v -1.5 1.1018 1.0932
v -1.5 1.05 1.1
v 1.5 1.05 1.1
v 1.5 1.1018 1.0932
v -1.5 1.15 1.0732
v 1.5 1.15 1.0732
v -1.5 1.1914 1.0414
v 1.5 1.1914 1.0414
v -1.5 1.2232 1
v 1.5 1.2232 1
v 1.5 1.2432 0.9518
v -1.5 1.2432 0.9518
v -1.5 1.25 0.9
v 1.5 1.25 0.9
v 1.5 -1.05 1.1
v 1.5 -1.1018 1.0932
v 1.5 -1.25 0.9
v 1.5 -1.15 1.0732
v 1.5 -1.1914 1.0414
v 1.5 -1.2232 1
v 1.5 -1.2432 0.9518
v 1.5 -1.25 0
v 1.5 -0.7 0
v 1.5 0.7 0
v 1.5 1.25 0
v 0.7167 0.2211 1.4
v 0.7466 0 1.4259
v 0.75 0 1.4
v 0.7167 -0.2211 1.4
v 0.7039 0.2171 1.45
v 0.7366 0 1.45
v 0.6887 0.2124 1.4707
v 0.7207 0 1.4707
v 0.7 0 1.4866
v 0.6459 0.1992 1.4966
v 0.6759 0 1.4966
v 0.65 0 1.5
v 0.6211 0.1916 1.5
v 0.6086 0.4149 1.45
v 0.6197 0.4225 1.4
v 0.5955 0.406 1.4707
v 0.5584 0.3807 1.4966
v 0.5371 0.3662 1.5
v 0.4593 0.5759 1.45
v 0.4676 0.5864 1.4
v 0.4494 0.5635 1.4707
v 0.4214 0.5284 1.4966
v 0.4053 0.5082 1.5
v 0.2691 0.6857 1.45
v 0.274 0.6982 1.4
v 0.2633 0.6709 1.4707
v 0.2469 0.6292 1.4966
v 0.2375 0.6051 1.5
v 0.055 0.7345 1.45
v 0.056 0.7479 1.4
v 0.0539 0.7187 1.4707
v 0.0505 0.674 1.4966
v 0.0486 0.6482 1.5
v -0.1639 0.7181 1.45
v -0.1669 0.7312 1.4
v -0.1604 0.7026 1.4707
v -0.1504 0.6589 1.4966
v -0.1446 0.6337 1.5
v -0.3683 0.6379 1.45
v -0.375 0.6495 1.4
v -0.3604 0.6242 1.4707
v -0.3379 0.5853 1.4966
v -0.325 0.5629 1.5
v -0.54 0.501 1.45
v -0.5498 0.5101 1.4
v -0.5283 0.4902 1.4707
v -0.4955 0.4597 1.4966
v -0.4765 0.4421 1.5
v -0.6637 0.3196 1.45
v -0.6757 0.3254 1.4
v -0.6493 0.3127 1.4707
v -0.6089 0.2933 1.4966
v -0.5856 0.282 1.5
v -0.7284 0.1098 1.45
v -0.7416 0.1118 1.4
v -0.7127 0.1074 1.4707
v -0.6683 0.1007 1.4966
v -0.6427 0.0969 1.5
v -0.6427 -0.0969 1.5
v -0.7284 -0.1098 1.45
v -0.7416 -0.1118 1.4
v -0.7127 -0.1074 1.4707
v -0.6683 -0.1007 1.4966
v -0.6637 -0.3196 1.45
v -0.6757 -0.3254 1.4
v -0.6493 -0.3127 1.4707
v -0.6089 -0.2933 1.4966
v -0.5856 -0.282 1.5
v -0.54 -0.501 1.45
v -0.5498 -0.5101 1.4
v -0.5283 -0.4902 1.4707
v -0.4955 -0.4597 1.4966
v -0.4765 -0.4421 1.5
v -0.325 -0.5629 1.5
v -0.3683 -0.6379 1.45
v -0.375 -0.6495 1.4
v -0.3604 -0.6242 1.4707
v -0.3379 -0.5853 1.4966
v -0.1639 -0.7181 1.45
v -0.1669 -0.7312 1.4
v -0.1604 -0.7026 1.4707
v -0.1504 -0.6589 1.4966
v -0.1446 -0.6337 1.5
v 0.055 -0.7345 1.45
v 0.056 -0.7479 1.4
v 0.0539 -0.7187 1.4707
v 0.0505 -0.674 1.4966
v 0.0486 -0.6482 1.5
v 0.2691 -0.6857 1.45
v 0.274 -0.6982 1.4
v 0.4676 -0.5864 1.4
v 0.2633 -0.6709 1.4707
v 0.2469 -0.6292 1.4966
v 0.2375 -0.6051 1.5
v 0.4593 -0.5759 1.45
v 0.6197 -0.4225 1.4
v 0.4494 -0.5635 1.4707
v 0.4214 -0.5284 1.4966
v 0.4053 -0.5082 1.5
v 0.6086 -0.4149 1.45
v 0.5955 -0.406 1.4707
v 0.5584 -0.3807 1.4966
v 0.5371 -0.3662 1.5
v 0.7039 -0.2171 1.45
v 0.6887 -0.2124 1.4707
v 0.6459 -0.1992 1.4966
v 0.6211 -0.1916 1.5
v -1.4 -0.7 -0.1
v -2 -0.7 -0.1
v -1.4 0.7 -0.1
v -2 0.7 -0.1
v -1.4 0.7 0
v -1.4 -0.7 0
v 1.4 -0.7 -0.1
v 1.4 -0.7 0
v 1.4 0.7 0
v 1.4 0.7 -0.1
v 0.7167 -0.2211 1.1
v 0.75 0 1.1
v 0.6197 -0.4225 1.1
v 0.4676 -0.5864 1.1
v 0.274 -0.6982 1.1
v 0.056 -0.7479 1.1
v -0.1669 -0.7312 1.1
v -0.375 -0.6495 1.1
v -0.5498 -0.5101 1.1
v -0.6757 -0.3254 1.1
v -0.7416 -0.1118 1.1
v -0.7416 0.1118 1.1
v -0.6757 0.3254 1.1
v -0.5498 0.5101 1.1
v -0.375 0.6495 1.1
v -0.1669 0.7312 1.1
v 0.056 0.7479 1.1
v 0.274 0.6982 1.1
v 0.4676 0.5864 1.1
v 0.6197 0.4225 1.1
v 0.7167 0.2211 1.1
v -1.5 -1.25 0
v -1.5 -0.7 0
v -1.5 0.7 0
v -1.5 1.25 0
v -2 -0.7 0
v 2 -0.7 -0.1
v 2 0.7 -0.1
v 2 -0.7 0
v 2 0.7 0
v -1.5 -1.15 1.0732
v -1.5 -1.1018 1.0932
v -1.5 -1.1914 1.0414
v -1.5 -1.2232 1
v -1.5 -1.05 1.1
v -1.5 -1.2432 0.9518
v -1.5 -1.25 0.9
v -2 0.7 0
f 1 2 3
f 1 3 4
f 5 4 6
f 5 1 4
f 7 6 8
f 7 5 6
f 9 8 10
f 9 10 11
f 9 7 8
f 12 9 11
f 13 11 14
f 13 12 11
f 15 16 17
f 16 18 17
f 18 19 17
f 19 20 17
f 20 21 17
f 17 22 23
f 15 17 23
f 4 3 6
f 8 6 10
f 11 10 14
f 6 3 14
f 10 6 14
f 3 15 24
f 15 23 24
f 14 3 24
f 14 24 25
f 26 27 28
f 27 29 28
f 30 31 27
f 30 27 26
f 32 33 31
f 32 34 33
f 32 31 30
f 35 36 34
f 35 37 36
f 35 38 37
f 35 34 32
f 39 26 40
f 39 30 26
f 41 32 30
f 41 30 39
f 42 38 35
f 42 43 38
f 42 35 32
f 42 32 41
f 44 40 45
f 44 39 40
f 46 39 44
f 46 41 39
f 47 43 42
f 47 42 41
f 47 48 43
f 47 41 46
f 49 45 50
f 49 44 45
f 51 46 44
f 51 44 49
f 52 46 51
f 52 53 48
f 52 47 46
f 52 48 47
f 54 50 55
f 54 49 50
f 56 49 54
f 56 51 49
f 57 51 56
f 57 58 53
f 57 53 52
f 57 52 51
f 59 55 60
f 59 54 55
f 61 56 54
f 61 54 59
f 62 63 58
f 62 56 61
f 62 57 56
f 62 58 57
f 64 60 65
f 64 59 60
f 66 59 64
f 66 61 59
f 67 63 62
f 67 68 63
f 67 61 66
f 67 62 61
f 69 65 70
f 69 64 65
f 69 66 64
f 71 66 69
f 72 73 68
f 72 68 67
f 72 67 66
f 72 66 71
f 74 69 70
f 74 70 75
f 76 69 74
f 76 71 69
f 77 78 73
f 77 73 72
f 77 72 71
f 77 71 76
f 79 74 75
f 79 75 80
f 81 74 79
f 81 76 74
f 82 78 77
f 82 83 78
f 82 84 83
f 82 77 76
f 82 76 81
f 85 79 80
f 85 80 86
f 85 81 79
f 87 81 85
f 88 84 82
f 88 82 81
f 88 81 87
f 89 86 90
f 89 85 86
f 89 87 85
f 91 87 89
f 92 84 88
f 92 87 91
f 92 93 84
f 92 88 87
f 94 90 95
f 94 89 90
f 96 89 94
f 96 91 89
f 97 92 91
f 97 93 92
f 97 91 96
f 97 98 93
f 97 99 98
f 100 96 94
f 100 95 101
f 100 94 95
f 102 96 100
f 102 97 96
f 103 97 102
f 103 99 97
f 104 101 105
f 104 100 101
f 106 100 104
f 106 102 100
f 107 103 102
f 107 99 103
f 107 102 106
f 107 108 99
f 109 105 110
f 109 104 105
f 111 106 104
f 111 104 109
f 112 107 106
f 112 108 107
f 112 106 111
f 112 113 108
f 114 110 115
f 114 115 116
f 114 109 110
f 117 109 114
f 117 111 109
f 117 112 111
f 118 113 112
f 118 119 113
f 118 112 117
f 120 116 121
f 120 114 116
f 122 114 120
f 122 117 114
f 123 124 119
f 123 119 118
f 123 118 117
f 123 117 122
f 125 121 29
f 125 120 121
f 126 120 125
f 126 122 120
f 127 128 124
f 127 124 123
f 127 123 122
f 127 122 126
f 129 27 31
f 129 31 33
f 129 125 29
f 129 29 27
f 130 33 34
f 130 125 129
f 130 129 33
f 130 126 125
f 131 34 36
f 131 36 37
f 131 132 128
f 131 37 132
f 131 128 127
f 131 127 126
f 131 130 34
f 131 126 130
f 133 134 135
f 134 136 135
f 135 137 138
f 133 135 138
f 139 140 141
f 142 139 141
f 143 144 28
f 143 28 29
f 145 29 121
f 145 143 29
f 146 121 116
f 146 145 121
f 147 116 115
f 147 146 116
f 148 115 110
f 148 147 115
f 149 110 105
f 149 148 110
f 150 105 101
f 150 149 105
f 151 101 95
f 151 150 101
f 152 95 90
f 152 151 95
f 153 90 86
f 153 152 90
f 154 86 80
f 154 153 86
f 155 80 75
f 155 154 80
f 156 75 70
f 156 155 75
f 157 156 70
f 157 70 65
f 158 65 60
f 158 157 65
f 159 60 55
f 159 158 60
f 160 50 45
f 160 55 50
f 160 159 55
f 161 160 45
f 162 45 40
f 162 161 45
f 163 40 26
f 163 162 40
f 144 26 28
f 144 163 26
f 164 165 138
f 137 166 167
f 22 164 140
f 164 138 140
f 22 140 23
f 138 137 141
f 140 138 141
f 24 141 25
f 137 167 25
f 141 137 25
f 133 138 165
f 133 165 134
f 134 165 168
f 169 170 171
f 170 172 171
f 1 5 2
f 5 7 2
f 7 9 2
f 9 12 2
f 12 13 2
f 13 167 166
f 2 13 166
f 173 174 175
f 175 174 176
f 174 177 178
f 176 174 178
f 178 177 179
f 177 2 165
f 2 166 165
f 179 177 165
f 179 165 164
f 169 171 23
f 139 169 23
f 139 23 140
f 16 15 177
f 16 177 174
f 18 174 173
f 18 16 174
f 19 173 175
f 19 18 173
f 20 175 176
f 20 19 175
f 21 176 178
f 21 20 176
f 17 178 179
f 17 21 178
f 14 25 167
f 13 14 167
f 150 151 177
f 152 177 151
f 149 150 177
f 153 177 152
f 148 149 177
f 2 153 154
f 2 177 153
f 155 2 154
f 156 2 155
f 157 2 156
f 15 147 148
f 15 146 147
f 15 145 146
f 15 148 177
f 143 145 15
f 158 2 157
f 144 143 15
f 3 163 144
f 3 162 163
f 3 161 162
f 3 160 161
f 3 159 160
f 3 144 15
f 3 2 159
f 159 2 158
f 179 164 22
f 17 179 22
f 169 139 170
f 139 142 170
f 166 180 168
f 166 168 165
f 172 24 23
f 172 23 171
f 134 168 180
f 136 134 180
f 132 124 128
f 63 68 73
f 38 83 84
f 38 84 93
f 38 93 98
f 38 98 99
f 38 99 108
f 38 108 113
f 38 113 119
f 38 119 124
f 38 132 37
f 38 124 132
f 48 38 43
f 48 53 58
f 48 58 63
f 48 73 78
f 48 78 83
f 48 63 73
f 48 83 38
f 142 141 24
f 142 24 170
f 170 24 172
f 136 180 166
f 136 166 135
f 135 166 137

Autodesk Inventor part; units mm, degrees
ref_plane "YZ Plane" through (0, 0, 0) normal (1, 0, 0) x (0, 1, 0)
ref_plane "XZ Plane" through (0, 0, 0) normal (0, 1, 0) x (-1, 0, 0)
ref_plane "XY Plane" through (0, 0, 0) normal (0, 0, 1) x (1, 0, 0)
sketch "Sketch1" plane through (0, 0, 0) normal (0, 0, 1) x (1, 0, 0)
  line L0 (-1.5, -1.25) -> (1.5, -1.25)
  line L1 (1.5, -1.25) -> (1.5, 1.25)
  line L2 (1.5, 1.25) -> (-1.5, 1.25)
  line L3 (-1.5, 1.25) -> (-1.5, -1.25)
  line L4 (-1.5, -1.25) -> (1.5, 1.25) construction
  line L5 (1.5, -1.25) -> (-1.5, 1.25) construction
  line L6 (-2, 0.7) -> (-1.4, 0.7)
  line L7 (-1.4, 0.7) -> (-1.4, -0.7)
  line L8 (-1.4, -0.7) -> (-2, -0.7)
  line L9 (-2, -0.7) -> (-2, 0.7)
  line L10 (1.4, 0.7) -> (2, 0.7)
  line L11 (2, 0.7) -> (2, -0.7)
  line L12 (2, -0.7) -> (1.4, -0.7)
  line L13 (1.4, -0.7) -> (1.4, 0.7)
  line L14 (0, 1.25) -> (0, -1.25) construction
  point P0 (0, 0)
  point P1 (-2, 0)
  point P2 (0, 0)
  dimension "d0" = 3
  dimension "d1" = 2.5
  dimension "d2" = 4
  dimension "d3" = 1.4
  dimension "d4" = 2.8
extrude "Extrusion1" add sketch "Sketch1" along normal blind 1.1 contours L3 L8 L7 L6 L2 L1 L10 L13 L12 L0 | L3 L6 L7 L8 | L12 L13 L10 L1
extrude "Extrusion2" add sketch "Sketch1" against normal blind 0.1 contours L8 L9 L6 L3 | L3 L6 L7 L8 | L12 L13 L10 L1 | L1 L10 L11 L12
sketch "Sketch2" plane through (0, 0, 1.1) normal (0, 0, 1) x (1, 0, 0)
  circle A0 centre (0, 0) radius 0.75
  dimension "d9" = 1.5
extrude "Extrusion3" add sketch "Sketch2" along normal blind 0.4
fillet "Fillet1" radius 0.1 1 edges at (-0.75, 0, 1.5)
fillet "Fillet2" radius 0.2 2 edges at (0, 1.25, 1.1) (0, -1.25, 1.1)
properties part number "49-0002" material "Stainless Steel"
